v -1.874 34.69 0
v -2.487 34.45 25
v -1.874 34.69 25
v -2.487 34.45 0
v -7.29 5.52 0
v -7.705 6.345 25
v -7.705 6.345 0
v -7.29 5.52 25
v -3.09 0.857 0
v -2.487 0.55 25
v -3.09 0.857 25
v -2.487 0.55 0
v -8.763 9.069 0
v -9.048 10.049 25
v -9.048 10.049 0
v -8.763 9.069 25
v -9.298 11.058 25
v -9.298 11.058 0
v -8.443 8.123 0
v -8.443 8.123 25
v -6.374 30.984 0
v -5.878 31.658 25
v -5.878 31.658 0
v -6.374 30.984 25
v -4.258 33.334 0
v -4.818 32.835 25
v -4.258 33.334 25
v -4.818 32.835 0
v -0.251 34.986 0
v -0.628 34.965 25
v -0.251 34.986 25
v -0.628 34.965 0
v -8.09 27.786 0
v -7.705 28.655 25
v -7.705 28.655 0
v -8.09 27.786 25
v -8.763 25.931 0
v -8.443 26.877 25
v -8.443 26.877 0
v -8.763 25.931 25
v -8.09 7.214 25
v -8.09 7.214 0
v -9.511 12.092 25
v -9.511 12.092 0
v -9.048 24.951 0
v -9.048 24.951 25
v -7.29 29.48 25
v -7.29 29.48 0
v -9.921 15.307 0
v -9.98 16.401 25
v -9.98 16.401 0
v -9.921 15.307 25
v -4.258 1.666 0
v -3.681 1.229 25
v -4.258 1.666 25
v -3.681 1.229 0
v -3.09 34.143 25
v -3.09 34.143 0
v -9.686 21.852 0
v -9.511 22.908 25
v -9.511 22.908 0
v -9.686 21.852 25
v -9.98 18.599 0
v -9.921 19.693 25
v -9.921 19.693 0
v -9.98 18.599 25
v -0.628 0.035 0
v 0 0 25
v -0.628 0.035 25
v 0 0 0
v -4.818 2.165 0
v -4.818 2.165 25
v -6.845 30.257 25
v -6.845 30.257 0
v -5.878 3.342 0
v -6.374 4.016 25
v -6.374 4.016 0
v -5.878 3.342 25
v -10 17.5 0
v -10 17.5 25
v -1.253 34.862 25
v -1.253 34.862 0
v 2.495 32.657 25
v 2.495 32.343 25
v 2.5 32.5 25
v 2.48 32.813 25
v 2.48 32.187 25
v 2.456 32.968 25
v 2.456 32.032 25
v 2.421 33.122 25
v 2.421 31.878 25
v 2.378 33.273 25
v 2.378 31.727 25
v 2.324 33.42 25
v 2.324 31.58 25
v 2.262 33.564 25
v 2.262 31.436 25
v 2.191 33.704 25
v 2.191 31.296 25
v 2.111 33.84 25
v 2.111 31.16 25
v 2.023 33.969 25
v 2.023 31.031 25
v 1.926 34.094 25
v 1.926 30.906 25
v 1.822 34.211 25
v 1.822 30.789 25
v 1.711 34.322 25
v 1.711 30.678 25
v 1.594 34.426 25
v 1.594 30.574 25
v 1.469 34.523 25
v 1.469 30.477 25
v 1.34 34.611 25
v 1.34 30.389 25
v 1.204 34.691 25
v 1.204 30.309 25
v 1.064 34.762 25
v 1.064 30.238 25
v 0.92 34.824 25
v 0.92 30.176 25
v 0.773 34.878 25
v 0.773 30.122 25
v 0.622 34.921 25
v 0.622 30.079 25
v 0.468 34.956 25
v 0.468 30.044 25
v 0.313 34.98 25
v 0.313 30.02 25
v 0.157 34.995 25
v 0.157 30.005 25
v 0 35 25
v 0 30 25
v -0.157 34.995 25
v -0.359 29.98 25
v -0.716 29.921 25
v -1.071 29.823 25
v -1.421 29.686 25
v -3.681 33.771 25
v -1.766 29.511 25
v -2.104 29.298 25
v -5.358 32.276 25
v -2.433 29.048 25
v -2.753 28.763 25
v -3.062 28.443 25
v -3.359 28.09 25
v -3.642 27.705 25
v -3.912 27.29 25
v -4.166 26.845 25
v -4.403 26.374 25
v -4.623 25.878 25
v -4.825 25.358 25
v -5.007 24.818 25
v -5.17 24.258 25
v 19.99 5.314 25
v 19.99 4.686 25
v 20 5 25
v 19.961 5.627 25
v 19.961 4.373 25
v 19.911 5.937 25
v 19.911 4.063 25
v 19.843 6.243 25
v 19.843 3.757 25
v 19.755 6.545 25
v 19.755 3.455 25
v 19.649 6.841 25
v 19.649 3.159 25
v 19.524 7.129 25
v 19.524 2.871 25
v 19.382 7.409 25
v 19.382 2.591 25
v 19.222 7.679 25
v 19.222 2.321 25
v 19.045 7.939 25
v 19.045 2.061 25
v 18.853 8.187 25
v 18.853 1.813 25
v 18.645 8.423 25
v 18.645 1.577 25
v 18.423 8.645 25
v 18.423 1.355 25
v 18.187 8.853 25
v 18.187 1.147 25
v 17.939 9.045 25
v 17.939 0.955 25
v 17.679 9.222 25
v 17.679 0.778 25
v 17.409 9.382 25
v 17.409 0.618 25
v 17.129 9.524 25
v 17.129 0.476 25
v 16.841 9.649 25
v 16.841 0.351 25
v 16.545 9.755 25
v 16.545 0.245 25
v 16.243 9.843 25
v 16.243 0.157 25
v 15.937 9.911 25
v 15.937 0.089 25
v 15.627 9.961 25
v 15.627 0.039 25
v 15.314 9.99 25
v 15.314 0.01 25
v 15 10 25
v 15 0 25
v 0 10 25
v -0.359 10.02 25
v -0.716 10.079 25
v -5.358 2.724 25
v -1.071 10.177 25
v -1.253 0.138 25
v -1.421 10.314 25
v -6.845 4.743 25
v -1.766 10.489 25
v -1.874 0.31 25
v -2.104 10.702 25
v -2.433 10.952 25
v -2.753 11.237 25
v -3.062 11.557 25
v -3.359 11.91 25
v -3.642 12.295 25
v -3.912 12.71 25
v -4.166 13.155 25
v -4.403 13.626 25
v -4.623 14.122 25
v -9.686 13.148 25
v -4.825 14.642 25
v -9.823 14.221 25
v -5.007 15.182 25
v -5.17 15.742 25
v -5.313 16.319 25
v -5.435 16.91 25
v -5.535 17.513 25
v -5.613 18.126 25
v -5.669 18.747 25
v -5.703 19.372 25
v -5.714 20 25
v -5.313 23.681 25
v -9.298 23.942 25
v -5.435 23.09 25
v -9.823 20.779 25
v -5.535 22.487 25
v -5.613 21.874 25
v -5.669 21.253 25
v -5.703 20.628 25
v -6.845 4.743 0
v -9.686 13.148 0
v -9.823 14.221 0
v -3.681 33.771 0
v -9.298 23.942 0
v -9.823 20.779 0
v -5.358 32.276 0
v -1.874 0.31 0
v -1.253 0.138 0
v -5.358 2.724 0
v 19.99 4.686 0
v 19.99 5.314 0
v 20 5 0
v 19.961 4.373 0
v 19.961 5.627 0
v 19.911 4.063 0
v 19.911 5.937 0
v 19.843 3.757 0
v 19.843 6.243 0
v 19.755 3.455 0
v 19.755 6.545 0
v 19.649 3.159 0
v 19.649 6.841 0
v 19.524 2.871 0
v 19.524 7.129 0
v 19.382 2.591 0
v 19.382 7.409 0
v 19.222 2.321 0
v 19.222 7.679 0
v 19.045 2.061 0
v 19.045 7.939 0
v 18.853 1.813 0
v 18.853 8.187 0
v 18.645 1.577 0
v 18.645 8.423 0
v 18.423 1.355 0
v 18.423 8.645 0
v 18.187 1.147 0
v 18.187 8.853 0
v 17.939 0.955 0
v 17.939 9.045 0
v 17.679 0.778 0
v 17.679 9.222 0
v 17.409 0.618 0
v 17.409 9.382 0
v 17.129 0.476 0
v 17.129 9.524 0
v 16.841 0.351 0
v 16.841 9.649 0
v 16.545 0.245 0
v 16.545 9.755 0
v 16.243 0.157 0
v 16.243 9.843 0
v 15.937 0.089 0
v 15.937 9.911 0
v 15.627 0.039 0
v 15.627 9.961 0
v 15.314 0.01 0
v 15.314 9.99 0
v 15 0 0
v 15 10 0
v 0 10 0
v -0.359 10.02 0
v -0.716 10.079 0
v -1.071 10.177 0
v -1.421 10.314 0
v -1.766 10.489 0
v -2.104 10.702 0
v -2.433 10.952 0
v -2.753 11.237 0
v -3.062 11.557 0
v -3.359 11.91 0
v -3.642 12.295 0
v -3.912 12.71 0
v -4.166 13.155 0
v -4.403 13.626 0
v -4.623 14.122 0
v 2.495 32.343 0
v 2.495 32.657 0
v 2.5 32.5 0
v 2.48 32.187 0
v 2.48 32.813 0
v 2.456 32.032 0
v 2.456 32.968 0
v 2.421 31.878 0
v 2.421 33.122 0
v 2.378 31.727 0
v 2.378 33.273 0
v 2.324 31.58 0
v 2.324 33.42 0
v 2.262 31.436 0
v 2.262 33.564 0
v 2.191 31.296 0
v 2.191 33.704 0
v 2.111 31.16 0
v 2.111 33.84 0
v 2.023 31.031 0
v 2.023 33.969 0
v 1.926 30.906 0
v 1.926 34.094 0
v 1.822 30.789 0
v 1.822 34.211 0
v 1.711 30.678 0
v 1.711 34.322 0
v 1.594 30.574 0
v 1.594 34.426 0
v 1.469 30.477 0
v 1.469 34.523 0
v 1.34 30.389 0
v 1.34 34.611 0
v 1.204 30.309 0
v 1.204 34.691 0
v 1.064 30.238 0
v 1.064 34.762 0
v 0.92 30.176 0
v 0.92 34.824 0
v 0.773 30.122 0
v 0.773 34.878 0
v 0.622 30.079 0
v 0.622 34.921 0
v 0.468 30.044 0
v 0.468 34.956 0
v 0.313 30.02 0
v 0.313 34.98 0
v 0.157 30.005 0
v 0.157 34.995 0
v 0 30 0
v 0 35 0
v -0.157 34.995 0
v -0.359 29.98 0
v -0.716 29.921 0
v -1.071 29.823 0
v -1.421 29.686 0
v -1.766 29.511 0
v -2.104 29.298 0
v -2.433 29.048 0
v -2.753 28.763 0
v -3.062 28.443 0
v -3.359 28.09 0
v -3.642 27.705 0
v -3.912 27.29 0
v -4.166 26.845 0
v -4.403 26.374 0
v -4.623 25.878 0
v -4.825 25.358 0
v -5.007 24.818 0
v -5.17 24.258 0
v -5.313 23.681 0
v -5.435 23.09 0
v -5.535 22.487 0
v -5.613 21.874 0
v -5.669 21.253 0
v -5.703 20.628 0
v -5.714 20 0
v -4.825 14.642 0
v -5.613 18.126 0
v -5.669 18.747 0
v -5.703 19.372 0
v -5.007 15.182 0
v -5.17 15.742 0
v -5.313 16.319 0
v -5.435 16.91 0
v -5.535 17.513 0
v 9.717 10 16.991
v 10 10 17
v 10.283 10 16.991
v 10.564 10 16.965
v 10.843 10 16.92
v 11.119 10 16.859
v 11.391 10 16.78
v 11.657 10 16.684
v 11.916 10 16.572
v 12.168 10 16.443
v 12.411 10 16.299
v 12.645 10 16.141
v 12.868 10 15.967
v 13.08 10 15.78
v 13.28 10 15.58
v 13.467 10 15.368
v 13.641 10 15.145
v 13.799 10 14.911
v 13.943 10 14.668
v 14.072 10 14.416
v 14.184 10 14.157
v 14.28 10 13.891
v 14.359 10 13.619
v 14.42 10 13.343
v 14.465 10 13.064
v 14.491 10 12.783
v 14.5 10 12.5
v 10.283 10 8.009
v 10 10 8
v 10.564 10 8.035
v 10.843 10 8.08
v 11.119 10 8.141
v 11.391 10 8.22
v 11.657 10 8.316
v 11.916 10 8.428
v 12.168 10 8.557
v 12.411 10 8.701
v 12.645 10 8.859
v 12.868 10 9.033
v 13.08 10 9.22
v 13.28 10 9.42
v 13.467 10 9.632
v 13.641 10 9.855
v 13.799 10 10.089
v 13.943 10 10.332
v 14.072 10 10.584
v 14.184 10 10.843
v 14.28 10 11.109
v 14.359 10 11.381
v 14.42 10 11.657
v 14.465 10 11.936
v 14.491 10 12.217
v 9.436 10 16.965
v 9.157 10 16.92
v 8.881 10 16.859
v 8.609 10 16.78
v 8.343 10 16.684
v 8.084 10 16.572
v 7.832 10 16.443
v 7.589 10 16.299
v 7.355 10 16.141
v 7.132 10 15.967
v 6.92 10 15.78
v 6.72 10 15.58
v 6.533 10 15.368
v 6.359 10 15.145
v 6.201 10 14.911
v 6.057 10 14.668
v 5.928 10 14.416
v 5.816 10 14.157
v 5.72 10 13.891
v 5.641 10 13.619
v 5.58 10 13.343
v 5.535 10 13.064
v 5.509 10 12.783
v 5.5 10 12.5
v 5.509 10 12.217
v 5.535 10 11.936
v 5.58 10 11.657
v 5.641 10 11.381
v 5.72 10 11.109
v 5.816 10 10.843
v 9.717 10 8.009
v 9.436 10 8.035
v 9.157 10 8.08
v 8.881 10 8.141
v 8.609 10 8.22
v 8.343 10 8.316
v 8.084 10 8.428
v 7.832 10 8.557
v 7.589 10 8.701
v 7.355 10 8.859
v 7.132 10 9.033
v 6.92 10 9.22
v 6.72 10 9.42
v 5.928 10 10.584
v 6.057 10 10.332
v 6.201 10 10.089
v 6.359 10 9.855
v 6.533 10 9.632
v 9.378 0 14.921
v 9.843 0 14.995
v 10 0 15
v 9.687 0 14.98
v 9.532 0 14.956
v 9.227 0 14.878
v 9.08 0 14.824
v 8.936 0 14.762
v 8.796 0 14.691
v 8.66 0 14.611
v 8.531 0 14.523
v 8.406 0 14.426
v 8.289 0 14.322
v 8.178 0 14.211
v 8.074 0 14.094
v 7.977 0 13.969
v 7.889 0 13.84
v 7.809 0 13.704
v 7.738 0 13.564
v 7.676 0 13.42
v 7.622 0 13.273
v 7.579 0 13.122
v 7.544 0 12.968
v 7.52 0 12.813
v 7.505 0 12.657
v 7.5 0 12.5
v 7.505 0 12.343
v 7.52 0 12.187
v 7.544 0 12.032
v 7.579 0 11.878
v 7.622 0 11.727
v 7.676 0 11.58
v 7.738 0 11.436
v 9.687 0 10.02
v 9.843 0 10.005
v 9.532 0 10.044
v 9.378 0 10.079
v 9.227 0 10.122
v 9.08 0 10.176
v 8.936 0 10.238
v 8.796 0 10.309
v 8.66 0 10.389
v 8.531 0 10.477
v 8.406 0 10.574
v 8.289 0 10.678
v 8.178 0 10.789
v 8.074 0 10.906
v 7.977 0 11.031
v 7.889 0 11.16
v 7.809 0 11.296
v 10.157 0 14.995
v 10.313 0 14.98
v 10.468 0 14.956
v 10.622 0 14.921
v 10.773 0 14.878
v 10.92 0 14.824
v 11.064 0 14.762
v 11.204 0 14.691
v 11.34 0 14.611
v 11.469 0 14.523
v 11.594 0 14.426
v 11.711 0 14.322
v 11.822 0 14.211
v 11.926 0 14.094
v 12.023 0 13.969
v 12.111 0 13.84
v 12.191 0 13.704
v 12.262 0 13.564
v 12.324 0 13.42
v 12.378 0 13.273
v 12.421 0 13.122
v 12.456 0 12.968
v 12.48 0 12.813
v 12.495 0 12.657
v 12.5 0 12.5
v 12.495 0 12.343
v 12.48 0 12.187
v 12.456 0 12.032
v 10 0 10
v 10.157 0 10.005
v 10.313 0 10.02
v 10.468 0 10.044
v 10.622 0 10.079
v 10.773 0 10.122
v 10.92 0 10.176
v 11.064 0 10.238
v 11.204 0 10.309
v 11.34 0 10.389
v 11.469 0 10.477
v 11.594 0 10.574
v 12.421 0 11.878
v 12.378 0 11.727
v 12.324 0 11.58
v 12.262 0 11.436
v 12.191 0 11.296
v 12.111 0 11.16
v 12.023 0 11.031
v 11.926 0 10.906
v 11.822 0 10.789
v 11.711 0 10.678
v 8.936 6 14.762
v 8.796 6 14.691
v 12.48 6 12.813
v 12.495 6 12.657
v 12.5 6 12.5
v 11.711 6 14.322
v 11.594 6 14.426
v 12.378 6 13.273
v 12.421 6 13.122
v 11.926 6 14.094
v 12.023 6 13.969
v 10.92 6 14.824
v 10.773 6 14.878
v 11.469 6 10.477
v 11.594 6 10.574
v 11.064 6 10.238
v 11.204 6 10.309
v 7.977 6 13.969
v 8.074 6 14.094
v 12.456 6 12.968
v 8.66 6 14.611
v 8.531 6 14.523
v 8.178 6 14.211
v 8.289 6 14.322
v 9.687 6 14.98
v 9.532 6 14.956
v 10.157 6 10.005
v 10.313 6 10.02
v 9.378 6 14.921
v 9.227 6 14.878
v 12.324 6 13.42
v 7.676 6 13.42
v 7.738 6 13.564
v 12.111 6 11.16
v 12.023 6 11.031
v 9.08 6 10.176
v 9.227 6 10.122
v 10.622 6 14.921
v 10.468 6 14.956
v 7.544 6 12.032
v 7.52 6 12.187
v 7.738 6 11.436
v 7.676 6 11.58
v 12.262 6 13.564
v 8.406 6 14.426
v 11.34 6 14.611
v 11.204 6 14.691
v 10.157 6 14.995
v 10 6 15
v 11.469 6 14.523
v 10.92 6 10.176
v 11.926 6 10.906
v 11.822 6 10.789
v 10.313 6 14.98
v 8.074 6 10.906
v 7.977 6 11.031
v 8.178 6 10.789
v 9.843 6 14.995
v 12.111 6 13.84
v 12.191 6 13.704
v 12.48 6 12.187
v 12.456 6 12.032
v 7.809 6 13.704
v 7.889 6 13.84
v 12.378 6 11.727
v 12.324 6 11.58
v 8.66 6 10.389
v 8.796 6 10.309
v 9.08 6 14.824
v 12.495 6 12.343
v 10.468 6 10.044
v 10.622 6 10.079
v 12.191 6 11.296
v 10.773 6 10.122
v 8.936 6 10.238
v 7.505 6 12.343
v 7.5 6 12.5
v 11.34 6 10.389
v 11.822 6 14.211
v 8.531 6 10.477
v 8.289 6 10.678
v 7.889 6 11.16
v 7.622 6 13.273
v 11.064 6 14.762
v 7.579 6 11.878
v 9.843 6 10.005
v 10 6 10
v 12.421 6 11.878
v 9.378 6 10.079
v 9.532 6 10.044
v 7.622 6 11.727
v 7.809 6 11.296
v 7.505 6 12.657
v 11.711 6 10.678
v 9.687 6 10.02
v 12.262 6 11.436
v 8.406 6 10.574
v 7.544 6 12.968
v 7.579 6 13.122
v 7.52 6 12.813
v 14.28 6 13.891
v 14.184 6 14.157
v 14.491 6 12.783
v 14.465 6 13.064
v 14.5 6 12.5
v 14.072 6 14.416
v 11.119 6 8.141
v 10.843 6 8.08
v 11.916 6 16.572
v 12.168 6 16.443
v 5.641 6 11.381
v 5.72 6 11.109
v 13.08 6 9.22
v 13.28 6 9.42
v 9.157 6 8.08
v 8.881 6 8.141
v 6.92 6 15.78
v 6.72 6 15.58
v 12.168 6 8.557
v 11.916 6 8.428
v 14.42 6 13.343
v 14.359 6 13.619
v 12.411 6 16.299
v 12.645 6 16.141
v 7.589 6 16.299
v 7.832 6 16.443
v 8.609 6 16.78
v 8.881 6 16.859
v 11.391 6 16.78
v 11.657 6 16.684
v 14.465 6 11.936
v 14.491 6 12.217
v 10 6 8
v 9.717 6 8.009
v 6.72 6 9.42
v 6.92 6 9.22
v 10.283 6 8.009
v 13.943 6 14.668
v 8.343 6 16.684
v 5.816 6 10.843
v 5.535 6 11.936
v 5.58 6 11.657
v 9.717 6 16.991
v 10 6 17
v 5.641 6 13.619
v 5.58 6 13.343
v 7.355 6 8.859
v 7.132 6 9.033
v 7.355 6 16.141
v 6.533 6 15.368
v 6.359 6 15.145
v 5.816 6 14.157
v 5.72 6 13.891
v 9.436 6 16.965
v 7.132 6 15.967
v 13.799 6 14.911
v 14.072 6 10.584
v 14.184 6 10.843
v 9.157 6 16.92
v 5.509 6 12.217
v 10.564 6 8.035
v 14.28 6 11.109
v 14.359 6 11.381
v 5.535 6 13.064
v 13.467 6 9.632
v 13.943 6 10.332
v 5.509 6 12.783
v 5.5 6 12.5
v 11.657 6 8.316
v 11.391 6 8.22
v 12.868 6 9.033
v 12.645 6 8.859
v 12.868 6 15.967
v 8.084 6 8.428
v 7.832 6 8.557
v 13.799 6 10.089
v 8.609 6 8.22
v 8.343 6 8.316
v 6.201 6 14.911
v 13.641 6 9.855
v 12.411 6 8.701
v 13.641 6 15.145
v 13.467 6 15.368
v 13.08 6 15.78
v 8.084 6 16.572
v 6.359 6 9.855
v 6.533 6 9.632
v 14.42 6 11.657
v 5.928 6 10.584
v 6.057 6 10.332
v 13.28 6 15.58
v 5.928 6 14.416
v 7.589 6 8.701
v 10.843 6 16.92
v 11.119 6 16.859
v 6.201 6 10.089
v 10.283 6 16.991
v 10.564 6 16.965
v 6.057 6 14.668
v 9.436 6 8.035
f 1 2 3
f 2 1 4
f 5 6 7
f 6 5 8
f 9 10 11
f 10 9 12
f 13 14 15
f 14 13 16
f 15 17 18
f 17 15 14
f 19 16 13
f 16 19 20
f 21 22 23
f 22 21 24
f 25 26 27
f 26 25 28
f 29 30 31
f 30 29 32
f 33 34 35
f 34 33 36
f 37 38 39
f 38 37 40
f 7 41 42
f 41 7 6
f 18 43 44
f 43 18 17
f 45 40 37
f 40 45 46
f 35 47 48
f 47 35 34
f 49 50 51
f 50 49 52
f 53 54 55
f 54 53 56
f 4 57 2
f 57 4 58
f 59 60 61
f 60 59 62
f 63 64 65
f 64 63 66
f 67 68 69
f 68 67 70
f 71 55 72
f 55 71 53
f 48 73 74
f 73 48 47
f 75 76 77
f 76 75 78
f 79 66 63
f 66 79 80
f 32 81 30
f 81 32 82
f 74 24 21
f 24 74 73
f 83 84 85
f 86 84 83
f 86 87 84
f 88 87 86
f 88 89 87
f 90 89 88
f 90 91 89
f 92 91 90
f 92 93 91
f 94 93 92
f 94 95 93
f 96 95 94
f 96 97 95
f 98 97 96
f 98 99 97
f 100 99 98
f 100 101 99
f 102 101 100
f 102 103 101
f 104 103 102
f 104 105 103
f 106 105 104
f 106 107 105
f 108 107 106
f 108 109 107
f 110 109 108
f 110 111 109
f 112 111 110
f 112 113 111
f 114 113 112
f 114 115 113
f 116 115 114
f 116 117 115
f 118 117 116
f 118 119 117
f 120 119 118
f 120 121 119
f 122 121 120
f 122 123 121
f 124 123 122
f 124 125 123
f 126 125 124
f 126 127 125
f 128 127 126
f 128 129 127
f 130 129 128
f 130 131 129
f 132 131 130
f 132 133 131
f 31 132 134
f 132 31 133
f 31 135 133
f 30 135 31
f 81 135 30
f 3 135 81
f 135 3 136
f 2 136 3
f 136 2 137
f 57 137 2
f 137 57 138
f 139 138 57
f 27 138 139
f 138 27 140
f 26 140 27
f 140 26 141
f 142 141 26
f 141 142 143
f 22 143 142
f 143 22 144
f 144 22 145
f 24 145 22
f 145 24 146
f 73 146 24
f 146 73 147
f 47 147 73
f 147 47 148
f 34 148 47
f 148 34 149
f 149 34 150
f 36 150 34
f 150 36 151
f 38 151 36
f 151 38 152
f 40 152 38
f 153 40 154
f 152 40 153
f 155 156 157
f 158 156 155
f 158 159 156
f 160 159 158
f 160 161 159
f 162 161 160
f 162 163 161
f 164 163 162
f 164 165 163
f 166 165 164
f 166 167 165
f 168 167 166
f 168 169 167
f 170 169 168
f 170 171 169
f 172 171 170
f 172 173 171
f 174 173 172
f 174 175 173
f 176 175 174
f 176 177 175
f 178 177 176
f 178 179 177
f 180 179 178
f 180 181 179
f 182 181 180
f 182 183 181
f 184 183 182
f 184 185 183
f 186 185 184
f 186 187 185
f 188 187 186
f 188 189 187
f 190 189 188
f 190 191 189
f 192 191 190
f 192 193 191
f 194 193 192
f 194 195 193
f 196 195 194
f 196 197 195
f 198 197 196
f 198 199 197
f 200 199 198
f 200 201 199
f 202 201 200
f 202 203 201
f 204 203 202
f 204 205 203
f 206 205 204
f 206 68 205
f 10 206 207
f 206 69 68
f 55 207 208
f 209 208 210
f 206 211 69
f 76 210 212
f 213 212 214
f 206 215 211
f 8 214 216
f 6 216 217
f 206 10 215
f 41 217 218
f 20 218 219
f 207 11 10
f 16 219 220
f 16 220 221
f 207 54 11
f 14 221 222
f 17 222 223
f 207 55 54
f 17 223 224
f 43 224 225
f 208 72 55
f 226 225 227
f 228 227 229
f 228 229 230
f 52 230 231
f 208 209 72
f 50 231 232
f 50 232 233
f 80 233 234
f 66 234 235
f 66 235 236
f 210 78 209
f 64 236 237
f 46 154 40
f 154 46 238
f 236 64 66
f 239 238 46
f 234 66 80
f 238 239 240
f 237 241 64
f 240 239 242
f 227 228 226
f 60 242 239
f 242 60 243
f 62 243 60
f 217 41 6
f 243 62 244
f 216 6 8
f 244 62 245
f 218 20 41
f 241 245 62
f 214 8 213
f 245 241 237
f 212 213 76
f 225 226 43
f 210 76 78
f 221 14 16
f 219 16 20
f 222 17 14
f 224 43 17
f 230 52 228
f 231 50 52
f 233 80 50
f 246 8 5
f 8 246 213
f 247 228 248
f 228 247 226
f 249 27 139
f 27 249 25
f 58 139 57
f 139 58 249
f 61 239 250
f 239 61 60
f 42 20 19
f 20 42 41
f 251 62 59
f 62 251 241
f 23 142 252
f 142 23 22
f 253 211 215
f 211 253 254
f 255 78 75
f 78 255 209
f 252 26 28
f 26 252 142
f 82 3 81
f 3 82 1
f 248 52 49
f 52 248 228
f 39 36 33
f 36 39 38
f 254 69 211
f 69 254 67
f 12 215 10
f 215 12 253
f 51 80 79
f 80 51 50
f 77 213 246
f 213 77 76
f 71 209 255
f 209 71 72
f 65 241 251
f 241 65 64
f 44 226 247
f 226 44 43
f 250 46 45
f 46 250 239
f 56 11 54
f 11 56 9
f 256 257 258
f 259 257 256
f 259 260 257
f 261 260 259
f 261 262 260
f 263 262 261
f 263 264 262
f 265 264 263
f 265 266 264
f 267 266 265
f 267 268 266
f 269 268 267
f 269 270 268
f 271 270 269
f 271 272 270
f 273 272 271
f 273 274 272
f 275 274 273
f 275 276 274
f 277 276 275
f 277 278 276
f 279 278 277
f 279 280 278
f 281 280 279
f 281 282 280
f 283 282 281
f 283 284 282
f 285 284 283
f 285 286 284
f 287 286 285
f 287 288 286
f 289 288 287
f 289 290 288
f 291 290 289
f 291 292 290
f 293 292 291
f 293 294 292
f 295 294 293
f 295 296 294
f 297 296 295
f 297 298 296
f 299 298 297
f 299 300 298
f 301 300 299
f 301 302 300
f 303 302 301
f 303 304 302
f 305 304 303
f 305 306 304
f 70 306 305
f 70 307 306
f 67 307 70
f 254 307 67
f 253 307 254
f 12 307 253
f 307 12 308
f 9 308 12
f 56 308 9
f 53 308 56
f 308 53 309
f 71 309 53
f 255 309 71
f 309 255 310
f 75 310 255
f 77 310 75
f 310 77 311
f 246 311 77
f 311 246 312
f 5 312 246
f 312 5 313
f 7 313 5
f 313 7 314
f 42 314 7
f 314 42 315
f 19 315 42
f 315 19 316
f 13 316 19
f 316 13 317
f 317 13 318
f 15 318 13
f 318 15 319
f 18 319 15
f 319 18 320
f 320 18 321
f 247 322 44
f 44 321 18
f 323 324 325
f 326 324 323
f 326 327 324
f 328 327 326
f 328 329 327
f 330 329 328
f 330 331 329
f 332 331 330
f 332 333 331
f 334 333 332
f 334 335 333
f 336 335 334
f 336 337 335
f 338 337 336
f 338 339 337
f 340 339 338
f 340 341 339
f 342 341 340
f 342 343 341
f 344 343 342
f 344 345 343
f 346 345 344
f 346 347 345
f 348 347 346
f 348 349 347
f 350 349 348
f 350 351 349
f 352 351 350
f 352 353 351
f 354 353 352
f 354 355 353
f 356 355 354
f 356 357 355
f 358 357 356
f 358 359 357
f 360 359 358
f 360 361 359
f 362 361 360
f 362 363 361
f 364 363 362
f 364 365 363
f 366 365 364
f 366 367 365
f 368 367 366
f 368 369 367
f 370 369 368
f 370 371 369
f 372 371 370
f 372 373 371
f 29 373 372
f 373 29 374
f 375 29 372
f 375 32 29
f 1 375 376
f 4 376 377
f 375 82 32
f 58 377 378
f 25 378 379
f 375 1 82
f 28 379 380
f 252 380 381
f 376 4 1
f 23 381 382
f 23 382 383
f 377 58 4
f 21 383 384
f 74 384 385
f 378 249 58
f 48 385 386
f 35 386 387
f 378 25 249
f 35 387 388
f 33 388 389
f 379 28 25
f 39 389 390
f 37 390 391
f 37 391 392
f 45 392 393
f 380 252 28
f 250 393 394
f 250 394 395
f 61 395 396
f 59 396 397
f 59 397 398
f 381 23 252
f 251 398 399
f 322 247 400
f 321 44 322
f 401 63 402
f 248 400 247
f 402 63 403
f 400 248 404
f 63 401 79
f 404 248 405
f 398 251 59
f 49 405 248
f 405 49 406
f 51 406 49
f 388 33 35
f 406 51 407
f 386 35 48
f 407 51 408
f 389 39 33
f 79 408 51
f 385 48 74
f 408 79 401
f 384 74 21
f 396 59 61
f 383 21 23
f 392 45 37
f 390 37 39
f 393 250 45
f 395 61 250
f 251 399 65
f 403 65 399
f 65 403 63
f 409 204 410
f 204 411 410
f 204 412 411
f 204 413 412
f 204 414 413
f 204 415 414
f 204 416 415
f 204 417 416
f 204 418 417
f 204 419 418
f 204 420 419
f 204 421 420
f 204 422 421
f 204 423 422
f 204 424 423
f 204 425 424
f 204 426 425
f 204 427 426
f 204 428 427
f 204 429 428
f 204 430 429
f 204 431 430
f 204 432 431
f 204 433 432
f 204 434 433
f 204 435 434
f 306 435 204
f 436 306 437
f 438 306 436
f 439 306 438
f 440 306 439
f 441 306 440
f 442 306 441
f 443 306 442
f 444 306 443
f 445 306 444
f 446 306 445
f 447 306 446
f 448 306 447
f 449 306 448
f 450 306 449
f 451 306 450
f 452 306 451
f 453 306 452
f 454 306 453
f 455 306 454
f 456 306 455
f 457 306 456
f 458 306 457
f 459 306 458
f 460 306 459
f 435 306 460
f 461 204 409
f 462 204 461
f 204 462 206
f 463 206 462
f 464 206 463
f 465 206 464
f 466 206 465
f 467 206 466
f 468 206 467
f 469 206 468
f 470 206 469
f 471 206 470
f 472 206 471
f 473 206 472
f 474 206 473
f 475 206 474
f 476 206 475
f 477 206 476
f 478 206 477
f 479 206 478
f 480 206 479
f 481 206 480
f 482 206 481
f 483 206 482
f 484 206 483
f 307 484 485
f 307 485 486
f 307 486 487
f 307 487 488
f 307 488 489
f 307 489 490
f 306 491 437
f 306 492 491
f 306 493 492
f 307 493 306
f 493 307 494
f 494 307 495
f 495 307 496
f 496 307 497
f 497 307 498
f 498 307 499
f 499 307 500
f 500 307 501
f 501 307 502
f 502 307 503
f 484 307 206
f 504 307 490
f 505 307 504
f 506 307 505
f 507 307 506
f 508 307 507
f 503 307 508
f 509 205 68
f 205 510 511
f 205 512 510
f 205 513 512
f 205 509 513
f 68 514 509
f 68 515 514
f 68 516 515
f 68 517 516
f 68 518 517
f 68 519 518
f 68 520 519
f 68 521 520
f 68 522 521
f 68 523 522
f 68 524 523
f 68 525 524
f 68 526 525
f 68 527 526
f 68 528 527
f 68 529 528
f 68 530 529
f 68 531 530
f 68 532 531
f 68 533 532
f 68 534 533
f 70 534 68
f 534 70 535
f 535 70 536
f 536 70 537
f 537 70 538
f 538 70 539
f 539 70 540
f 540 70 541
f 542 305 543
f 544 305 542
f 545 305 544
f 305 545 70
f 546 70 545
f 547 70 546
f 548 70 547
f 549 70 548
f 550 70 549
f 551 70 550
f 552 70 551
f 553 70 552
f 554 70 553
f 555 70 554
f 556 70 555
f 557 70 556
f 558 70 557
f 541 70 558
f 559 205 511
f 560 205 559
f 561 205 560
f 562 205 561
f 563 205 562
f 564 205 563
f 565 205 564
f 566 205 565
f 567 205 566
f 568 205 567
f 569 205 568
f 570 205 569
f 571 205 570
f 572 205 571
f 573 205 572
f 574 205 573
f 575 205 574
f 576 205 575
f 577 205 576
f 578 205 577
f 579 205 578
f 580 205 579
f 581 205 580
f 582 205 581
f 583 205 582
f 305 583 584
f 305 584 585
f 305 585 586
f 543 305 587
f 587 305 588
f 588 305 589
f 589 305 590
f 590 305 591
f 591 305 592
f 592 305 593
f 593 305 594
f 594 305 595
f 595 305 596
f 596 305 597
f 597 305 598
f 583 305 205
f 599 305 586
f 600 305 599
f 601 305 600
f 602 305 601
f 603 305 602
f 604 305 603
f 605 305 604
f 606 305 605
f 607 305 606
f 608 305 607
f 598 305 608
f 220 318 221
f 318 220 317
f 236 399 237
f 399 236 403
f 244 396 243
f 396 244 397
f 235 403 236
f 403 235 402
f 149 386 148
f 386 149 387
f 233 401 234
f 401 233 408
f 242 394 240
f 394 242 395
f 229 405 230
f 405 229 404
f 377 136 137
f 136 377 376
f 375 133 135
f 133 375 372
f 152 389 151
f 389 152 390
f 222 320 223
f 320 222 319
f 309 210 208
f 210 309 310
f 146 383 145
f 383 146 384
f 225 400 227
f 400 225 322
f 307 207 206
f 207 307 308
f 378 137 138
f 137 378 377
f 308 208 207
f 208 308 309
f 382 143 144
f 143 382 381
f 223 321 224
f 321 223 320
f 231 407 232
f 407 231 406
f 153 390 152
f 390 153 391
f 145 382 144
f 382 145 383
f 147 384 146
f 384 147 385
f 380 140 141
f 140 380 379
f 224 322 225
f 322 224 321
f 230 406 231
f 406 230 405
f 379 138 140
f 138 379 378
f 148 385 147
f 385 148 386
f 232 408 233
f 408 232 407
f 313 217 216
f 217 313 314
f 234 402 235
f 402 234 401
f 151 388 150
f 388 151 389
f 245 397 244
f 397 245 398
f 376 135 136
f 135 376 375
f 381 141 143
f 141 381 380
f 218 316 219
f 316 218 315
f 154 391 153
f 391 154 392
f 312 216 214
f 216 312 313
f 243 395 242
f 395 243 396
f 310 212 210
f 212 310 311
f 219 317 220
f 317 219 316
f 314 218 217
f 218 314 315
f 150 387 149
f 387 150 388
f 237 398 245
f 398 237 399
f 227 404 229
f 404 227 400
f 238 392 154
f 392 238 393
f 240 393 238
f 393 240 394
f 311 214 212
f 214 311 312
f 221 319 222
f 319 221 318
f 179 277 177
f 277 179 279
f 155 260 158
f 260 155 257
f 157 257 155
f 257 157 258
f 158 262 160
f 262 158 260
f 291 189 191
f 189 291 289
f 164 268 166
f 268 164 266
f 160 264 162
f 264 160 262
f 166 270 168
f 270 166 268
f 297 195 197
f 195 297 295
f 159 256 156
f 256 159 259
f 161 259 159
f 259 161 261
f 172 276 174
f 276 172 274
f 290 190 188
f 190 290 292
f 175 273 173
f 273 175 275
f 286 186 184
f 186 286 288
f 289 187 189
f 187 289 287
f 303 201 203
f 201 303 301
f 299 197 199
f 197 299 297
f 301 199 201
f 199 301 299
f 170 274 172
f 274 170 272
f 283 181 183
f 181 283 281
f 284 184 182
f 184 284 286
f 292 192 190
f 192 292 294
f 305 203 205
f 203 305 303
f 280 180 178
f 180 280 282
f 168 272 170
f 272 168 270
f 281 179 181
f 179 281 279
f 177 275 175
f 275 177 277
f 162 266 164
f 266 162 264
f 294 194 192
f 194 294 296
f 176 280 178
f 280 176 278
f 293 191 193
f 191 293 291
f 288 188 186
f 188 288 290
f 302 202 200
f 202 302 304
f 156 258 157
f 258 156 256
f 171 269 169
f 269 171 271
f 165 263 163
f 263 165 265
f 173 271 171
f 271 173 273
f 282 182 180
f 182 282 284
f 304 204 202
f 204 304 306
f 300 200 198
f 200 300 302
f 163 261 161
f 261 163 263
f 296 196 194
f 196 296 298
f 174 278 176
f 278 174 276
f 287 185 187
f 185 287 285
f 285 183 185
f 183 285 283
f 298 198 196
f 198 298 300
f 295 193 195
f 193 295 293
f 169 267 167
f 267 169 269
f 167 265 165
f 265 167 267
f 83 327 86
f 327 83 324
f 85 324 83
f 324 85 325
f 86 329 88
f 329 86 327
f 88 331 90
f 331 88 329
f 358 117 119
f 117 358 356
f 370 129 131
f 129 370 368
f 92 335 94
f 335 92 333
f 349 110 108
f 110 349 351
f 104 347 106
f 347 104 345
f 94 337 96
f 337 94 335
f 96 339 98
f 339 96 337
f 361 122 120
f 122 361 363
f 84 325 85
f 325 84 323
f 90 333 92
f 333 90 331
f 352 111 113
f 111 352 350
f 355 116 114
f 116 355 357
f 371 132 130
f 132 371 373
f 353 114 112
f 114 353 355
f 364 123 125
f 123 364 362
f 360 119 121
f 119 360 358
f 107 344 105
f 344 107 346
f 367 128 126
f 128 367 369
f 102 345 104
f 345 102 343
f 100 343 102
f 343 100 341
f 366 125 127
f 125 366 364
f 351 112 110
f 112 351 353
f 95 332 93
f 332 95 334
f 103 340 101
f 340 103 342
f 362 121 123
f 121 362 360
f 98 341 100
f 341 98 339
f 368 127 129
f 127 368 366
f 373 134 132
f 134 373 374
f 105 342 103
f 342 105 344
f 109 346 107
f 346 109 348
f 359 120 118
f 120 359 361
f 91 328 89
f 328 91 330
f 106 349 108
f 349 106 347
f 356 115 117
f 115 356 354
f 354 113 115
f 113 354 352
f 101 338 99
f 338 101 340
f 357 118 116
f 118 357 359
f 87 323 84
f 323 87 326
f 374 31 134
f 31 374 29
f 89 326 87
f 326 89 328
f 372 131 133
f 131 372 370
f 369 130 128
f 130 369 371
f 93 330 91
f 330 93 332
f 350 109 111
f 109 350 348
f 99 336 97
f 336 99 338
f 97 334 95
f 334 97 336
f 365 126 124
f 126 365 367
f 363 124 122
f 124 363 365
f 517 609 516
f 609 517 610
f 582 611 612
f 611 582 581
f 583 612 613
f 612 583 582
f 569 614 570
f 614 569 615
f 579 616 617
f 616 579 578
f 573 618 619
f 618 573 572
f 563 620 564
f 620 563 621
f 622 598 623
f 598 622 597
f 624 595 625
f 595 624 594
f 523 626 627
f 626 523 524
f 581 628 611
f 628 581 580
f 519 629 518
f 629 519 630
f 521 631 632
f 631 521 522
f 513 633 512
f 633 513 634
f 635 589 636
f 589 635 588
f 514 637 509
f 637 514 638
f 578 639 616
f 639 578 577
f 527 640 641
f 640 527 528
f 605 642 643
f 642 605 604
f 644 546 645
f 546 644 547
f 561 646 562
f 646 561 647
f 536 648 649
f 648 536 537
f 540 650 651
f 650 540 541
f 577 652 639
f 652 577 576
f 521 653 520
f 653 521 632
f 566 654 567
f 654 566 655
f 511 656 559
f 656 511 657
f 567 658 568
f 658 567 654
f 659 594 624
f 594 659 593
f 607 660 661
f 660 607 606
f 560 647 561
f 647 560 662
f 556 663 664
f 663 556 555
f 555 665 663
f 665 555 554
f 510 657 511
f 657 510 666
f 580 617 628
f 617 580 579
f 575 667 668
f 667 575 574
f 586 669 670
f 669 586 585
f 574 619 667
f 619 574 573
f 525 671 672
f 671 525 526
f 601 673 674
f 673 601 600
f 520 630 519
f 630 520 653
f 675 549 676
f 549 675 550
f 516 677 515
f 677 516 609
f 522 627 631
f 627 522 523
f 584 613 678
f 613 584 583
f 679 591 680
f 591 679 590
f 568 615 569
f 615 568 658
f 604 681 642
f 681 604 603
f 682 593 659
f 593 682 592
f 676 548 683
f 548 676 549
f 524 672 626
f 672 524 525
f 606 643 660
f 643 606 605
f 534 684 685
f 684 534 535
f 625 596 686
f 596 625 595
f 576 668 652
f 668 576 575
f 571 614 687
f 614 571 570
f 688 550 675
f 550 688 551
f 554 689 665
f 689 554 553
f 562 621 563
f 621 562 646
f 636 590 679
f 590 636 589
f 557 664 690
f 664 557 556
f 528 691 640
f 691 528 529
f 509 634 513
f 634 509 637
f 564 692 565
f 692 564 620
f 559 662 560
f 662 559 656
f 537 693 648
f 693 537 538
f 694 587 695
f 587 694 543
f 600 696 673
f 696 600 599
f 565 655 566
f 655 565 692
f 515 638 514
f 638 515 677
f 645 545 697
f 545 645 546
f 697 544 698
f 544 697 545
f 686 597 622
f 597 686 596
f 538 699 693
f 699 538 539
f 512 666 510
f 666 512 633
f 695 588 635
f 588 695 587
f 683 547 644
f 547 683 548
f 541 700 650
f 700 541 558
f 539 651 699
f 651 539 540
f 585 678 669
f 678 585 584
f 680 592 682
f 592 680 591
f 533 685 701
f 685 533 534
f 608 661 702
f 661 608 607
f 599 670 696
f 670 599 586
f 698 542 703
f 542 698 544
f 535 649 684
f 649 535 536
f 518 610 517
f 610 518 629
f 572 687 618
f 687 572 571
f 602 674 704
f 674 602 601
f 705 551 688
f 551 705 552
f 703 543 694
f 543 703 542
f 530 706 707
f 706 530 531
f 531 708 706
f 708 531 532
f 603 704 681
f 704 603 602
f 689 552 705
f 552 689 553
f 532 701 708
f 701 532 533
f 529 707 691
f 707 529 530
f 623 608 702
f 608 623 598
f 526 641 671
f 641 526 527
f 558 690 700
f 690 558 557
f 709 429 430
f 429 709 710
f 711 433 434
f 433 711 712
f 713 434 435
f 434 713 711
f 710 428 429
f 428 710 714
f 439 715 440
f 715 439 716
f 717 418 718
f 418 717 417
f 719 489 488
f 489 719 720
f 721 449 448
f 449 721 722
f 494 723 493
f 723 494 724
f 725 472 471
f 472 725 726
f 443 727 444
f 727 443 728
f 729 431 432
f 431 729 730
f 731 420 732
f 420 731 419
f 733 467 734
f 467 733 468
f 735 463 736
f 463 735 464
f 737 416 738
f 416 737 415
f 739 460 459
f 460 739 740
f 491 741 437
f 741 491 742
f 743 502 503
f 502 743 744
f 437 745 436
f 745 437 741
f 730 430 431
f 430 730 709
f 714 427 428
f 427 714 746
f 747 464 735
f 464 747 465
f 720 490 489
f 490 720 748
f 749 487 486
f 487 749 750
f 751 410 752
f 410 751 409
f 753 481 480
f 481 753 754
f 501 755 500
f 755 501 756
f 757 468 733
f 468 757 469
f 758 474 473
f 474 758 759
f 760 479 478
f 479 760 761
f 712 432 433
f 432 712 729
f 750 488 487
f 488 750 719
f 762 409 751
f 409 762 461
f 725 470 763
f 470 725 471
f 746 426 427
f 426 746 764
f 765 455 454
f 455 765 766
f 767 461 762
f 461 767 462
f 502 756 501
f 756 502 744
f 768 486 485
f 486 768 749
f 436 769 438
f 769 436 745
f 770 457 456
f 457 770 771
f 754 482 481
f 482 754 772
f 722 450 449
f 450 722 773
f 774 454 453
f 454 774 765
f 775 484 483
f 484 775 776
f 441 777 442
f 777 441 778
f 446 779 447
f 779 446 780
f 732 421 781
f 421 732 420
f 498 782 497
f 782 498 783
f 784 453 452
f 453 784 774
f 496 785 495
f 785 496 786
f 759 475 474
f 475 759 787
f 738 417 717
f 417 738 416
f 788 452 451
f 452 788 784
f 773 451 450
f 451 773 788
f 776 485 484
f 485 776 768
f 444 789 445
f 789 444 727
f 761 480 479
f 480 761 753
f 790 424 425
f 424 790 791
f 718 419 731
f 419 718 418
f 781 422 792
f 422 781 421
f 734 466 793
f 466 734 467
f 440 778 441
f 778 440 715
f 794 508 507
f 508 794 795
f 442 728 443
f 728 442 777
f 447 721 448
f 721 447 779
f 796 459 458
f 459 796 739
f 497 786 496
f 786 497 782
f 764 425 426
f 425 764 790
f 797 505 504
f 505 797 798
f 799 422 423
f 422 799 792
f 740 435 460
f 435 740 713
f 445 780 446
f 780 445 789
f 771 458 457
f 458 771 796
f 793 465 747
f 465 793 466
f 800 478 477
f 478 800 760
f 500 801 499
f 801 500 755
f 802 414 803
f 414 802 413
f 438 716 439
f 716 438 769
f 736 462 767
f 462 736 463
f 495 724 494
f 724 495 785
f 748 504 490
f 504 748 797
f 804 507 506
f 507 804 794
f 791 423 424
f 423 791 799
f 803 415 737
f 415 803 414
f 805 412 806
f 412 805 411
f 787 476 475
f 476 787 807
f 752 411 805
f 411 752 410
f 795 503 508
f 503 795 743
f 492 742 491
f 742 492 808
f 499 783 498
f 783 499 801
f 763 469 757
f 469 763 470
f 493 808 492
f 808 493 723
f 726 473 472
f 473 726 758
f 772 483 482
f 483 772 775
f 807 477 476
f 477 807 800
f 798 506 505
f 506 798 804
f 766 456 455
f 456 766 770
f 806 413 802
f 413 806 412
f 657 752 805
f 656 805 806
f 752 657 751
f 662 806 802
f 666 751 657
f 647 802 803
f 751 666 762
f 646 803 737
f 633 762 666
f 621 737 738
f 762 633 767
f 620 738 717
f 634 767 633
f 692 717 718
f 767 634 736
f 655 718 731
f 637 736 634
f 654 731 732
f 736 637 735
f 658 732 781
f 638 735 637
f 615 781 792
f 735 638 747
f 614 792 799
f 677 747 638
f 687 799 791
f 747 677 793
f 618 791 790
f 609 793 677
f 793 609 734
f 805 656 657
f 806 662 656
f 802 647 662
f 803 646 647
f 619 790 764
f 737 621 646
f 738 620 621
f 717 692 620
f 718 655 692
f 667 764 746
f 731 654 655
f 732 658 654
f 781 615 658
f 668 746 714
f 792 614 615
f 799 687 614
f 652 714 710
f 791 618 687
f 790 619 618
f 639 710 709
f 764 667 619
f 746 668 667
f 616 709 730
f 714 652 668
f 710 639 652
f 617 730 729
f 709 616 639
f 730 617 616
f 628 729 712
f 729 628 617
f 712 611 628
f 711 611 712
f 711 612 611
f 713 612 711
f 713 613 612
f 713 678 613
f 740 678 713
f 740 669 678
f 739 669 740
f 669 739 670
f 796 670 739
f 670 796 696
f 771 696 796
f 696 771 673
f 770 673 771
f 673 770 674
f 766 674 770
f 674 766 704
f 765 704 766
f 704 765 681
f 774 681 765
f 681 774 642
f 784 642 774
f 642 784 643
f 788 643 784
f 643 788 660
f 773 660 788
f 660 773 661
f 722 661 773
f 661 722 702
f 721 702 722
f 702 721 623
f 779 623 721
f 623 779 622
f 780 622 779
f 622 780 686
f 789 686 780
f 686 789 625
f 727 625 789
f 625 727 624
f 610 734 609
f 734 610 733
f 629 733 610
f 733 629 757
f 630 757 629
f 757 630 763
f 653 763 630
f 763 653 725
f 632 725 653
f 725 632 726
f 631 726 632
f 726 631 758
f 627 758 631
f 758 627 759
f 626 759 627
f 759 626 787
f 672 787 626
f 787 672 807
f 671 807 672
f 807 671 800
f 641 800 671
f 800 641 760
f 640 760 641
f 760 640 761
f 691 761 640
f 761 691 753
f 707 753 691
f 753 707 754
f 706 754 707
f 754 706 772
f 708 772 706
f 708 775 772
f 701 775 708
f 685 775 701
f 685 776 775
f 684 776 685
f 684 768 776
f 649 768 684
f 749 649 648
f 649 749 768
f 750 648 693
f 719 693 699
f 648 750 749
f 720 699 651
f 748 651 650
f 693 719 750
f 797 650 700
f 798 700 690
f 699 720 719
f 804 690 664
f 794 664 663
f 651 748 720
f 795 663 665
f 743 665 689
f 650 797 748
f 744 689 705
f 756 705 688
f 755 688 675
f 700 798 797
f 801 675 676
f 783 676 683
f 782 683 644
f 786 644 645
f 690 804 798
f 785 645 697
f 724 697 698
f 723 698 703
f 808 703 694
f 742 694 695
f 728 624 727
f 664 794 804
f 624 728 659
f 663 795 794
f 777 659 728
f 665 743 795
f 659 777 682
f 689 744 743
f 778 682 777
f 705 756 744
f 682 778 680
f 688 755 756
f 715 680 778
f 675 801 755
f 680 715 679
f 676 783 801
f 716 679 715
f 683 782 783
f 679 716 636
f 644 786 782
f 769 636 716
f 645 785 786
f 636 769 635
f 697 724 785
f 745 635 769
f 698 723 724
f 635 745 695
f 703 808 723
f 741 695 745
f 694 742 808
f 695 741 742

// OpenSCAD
dist = 20;
l_1 = 10;
l_2 = 5;
d_1 = 2 * ( dist - l_1 );
d_2 = l_1 + l_2 + d_1;
w = 25;
m = 2;
h = 15;

he_room = 4;
he_d = 9;
h_d = 5;

s = 20 / d_2;

difference(){
    union(){
        difference(){
            union(){
                translate( [ 0, d_2 / 2, 0 ] )
                scale( [ s, 1, 1 ] )
                    cylinder( d = d_2, h = w, $fn = 100 );
                
                cube( [ d_2 / 2, l_1, w ] );
        
            }
            
            translate( [ 0, l_1 + d_1 / 2, -1 ] )
            scale( [ s, 1, 1 ] )
                cylinder( d = d_1, h = w + 2, $fn = 100 );    
            translate( [ 0, l_1, -1 ] )
                cube( [ 100, 100, w + 2 ] );
            translate( [ h, -1, -1 ] )
                cube( [ 100, 100, 100 ] );
        }
        
        translate( [ h, l_1 / 2, 0 ] )
            cylinder( d = l_1, h = w, $fn = 100 );
        translate( [ 0, l_1 + d_1 + l_2 / 2, 0 ] )
            cylinder( d = l_2, h = w, $fn = 100 );
    }
    
    translate( [ ( h + l_1 / 2 ) / 2, 50, w / 2 ] )
        rotate( 90, [ 1, 0, 0 ] )
            cylinder( d = h_d, h = 100, $fn = 100 );

    translate( [ ( h + l_1 / 2 ) / 2, 100 + ( l_1 - he_room ), w / 2 ] )
        rotate( 90, [ 1, 0, 0 ] )
            cylinder( d = he_d, h = 100, $fn = 100 );
}
